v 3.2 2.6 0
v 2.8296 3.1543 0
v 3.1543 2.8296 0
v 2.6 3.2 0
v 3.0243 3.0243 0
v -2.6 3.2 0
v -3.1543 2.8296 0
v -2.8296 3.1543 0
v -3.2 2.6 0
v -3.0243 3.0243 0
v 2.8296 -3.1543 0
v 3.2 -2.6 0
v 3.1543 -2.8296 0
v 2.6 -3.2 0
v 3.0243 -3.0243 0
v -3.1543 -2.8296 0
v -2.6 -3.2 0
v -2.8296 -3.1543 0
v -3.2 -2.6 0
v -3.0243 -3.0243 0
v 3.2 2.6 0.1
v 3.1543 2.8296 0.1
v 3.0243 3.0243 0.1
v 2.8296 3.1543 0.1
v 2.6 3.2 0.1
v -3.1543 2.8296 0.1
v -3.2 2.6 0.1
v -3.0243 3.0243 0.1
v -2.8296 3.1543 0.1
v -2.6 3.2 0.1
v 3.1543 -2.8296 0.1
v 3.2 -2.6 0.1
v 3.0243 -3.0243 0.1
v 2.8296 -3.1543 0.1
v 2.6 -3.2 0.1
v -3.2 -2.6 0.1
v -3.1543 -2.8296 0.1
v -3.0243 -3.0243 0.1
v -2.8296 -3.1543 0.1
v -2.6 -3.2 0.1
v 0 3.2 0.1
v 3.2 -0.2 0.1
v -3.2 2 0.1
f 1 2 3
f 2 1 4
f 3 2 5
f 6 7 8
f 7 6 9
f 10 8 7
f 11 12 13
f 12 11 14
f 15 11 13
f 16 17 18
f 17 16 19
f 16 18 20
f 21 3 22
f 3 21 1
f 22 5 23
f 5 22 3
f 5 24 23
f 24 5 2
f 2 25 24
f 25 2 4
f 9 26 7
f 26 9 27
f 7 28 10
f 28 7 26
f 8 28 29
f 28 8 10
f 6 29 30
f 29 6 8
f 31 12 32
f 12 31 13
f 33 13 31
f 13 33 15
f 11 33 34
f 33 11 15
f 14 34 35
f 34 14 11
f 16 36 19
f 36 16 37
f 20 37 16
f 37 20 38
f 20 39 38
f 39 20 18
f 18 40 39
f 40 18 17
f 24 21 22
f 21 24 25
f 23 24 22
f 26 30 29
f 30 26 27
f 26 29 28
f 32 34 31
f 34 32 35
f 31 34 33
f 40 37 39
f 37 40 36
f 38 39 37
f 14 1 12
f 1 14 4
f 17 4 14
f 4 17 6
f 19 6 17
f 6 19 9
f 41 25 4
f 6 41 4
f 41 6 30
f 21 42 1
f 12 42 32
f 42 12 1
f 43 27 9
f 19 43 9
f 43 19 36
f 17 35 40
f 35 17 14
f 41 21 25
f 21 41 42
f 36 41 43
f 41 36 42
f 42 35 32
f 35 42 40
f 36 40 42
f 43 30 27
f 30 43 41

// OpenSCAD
// file: ../p/1-4cyli.scad
use <../lib.scad>
function ldraw_lib__1_4cyli() = [
// 0 Cylinder 0.25
// 0 Name: 1-4cyli.dat
// 0 Author: James Jessiman
// 0 !LDRAW_ORG Primitive UPDATE 2012-01
// 0 !LICENSE Licensed under CC BY 4.0 : see CAreadme.txt
// 
// 0 BFC CERTIFY CCW
  [0,"BFC","CERTIFY"],
  [0,"BFC","CCW"],
// 
// 0 !HISTORY 2002-03-23 [sbliss] Added BFC statement.
// 0 !HISTORY 2002-04-25 [PTadmin] Official Update 2002-02
// 0 !HISTORY 2007-06-22 [PTadmin] Header formatted for Contributor Agreement
// 0 !HISTORY 2008-07-01 [PTadmin] Official Update 2008-01
// 0 !HISTORY 2012-02-16 [Philo] Changed to CCW
// 0 !HISTORY 2012-03-30 [PTadmin] Official Update 2012-01
// 
// 
// 4 16 1 1 0 0.9239 1 0.3827 0.9239 0 0.3827 1 0 0
  [4,16,1,1,0,0.9239,1,0.3827,0.9239,0,0.3827,1,0,0],
// 5 24 1 0 0 1 1 0 0.9239 0 0.3827 1 0 -1
  [5,24,1,0,0,1,1,0,0.9239,0,0.3827,1,0,-1],
// 4 16 0.9239 1 0.3827 0.7071 1 0.7071 0.7071 0 0.7071 0.9239 0 0.3827
  [4,16,0.9239,1,0.3827,0.7071,1,0.7071,0.7071,0,0.7071,0.9239,0,0.3827],
// 5 24 0.9239 0 0.3827 0.9239 1 0.3827 0.7071 0 0.7071 1 0 0
  [5,24,0.9239,0,0.3827,0.9239,1,0.3827,0.7071,0,0.7071,1,0,0],
// 4 16 0.7071 1 0.7071 0.3827 1 0.9239 0.3827 0 0.9239 0.7071 0 0.7071
  [4,16,0.7071,1,0.7071,0.3827,1,0.9239,0.3827,0,0.9239,0.7071,0,0.7071],
// 5 24 0.7071 0 0.7071 0.7071 1 0.7071 0.3827 0 0.9239 0.9239 0 0.3827
  [5,24,0.7071,0,0.7071,0.7071,1,0.7071,0.3827,0,0.9239,0.9239,0,0.3827],
// 4 16 0.3827 1 0.9239 0 1 1 0 0 1 0.3827 0 0.9239
  [4,16,0.3827,1,0.9239,0,1,1,0,0,1,0.3827,0,0.9239],
// 5 24 0.3827 0 0.9239 0.3827 1 0.9239 0 0 1 0.7071 0 0.7071
  [5,24,0.3827,0,0.9239,0.3827,1,0.9239,0,0,1,0.7071,0,0.7071],
// 5 24 0 0 1 0 1 1 0.3827 0 0.9239 -1 0 1
  [5,24,0,0,1,0,1,1,0.3827,0,0.9239,-1,0,1],
];
module ldraw_lib__1_4cyli(step=0, col=false, unit=2/5, alt=false, line=0.2, solid=!$preview)
    makepoly(ldraw_lib__1_4cyli(), step=step, col=col, unit=unit, alt=alt, line=line, solid=solid);
ldraw_lib__1_4cyli(line=0.2);
// file: ../p/1-4chrd.scad
use <../lib.scad>
function ldraw_lib__1_4chrd() = [
// 0 Chord 0.25
// 0 Name: 1-4chrd.dat
// 0 Author: Max Martin Richter [MMR1988]
// 0 !LDRAW_ORG Primitive UPDATE 2023-05
// 0 !LICENSE Licensed under CC BY 4.0 : see CAreadme.txt
// 
// 0 BFC CERTIFY CCW
  [0,"BFC","CERTIFY"],
  [0,"BFC","CCW"],
// 
// 0 !HISTORY 2004-04-22 [PTadmin] Official Update 2004-02
// 0 !HISTORY 2007-10-09 [PTadmin] Header formatted for Contributor Agreement
// 0 !HISTORY 2008-07-01 [PTadmin] Official Update 2008-01
// 0 !HISTORY 2012-08-02 [MMR1988] Re-creation with PrimGen2 and Rectifier
// 0 !HISTORY 2012-08-09 [PTadmin] Official Update 2012-02
// 0 !HISTORY 2023-10-27 [OrionP] Change author to MMR1988 from hafhead
// 0 !HISTORY 2023-10-31 [OrionP] Official Update 2023-05
// 
// 4 16 0.9239 0 0.3827 0.3827 0 0.9239 0 0 1 1 0 0
  [4,16,0.9239,0,0.3827,0.3827,0,0.9239,0,0,1,1,0,0],
// 3 16 0.7071 0 0.7071 0.3827 0 0.9239 0.9239 0 0.3827
  [3,16,0.7071,0,0.7071,0.3827,0,0.9239,0.9239,0,0.3827],
];
module ldraw_lib__1_4chrd(step=0, col=false, unit=2/5, alt=false, line=0.2, solid=!$preview)
    makepoly(ldraw_lib__1_4chrd(), step=step, col=col, unit=unit, alt=alt, line=line, solid=solid);
ldraw_lib__1_4chrd(line=0.2);
// file: 6221655s.scad
use <../lib.scad>
use <../p/1-4chrd.scad>
use <../p/1-4cyli.scad>
function ldraw_lib__6221655s() = [
// 0 Sticker  0.8 x  0.8 with Grey and Red Stripes on White Background Right
// 0 Name: 6221655s.dat
// 0 Author: Massimo Maso [Sirio]
// 0 !LDRAW_ORG Part UPDATE 2024-09
// 0 !LICENSE Licensed under CC BY 4.0 : see CAreadme.txt
// 
// 0 BFC CERTIFY CCW
  [0,"BFC","CERTIFY"],
  [0,"BFC","CCW"],
// 
// 0 !KEYWORDS 3.0, 911 RSR, Porsche, Set 75888, Speed Champions
// 
// 0 !HISTORY 2024-10-27 [OrionP] Official Update 2024-09
// 
// 0 // Primitives
// 1 16 -6.5 0 6.5 -1.5 0 0 0 -1 0 0 0 1.5 1-4chrd.dat
  [1,16,-6.5,0,6.5,-1.5,0,0,0,-1,0,0,0,1.5, ldraw_lib__1_4chrd()],
// 1 16 6.5 0 6.5 1.5 0 0 0 -1 0 0 0 1.5 1-4chrd.dat
  [1,16,6.5,0,6.5,1.5,0,0,0,-1,0,0,0,1.5, ldraw_lib__1_4chrd()],
// 1 16 -6.5 0 -6.5 -1.5 0 0 0 -1 0 0 0 -1.5 1-4chrd.dat
  [1,16,-6.5,0,-6.5,-1.5,0,0,0,-1,0,0,0,-1.5, ldraw_lib__1_4chrd()],
// 1 16 6.5 0 -6.5 1.5 0 0 0 -1 0 0 0 -1.5 1-4chrd.dat
  [1,16,6.5,0,-6.5,1.5,0,0,0,-1,0,0,0,-1.5, ldraw_lib__1_4chrd()],
// 1 16 -6.5 -.25 6.5 -1.5 0 0 0 .25 0 0 0 1.5 1-4cyli.dat
  [1,16,-6.5,-.25,6.5,-1.5,0,0,0,.25,0,0,0,1.5, ldraw_lib__1_4cyli()],
// 1 16 6.5 -.25 6.5 1.5 0 0 0 .25 0 0 0 1.5 1-4cyli.dat
  [1,16,6.5,-.25,6.5,1.5,0,0,0,.25,0,0,0,1.5, ldraw_lib__1_4cyli()],
// 1 16 -6.5 -.25 -6.5 -1.5 0 0 0 .25 0 0 0 -1.5 1-4cyli.dat
  [1,16,-6.5,-.25,-6.5,-1.5,0,0,0,.25,0,0,0,-1.5, ldraw_lib__1_4cyli()],
// 1 16 6.5 -.25 -6.5 1.5 0 0 0 .25 0 0 0 -1.5 1-4cyli.dat
  [1,16,6.5,-.25,-6.5,1.5,0,0,0,.25,0,0,0,-1.5, ldraw_lib__1_4cyli()],
// 1 71 -6.5 -.25 6.5 -1.5 0 0 0 1 0 0 0 1.5 1-4chrd.dat
  [1,71,-6.5,-.25,6.5,-1.5,0,0,0,1,0,0,0,1.5, ldraw_lib__1_4chrd()],
// 1 15 6.5 -.25 6.5 1.5 0 0 0 1 0 0 0 1.5 1-4chrd.dat
  [1,15,6.5,-.25,6.5,1.5,0,0,0,1,0,0,0,1.5, ldraw_lib__1_4chrd()],
// 1 4 -6.5 -.25 -6.5 -1.5 0 0 0 1 0 0 0 -1.5 1-4chrd.dat
  [1,4,-6.5,-.25,-6.5,-1.5,0,0,0,1,0,0,0,-1.5, ldraw_lib__1_4chrd()],
// 1 4 6.5 -.25 -6.5 1.5 0 0 0 1 0 0 0 -1.5 1-4chrd.dat
  [1,4,6.5,-.25,-6.5,1.5,0,0,0,1,0,0,0,-1.5, ldraw_lib__1_4chrd()],
// 0 // Bottom face
// 4 16 -6.5 0 8 -6.5 0 -8 -8 0 -6.5 -8 0 6.5
  [4,16,-6.5,0,8,-6.5,0,-8,-8,0,-6.5,-8,0,6.5],
// 4 16 -6.5 0 8 6.5 0 8 6.5 0 -8 -6.5 0 -8
  [4,16,-6.5,0,8,6.5,0,8,6.5,0,-8,-6.5,0,-8],
// 4 16 6.5 0 8 8 0 6.5 8 0 -6.5 6.5 0 -8
  [4,16,6.5,0,8,8,0,6.5,8,0,-6.5,6.5,0,-8],
// 0 // Lateral face
// 3 16 -6.5 0 8 -6.5 -.25 8 0 -.25 8
  [3,16,-6.5,0,8,-6.5,-.25,8,0,-.25,8],
// 4 16 -6.5 0 8 0 -.25 8 6.5 -.25 8 6.5 0 8
  [4,16,-6.5,0,8,0,-.25,8,6.5,-.25,8,6.5,0,8],
// 3 16 -8 0 6.5 -8 -.25 -.5 -8 -.25 6.5
  [3,16,-8,0,6.5,-8,-.25,-.5,-8,-.25,6.5],
// 4 16 -8 0 6.5 -8 0 -6.5 -8 -.25 -6.5 -8 -.25 -.5
  [4,16,-8,0,6.5,-8,0,-6.5,-8,-.25,-6.5,-8,-.25,-.5],
// 3 16 8 0 6.5 8 -.25 6.5 8 -.25 5
  [3,16,8,0,6.5,8,-.25,6.5,8,-.25,5],
// 4 16 8 0 6.5 8 -.25 5 8 -.25 -6.5 8 0 -6.5
  [4,16,8,0,6.5,8,-.25,5,8,-.25,-6.5,8,0,-6.5],
// 4 16 -6.5 0 -8 6.5 0 -8 6.5 -.25 -8 -6.5 -.25 -8
  [4,16,-6.5,0,-8,6.5,0,-8,6.5,-.25,-8,-6.5,-.25,-8],
// 0 // Top face
// 0 // Grey faces
// 4 71 -8 -.25 -.5 0 -.25 8 -6.5 -.25 8 -8 -.25 6.5
  [4,71,-8,-.25,-.5,0,-.25,8,-6.5,-.25,8,-8,-.25,6.5],
// 4 71 -8 -.25 -.5 8 -.25 -6.5 8 -.25 5 0 -.25 8
  [4,71,-8,-.25,-.5,8,-.25,-6.5,8,-.25,5,0,-.25,8],
// 0 // Red faces
// 4 4 -8 -.25 -.5 -8 -.25 -6.5 -6.5 -.25 -8 6.5 -.25 -8
  [4,4,-8,-.25,-.5,-8,-.25,-6.5,-6.5,-.25,-8,6.5,-.25,-8],
// 3 4 -8 -.25 -.5 6.5 -.25 -8 8 -.25 -6.5
  [3,4,-8,-.25,-.5,6.5,-.25,-8,8,-.25,-6.5],
// 0 // White face
// 4 15 0 -.25 8 8 -.25 5 8 -.25 6.5 6.5 -.25 8
  [4,15,0,-.25,8,8,-.25,5,8,-.25,6.5,6.5,-.25,8],
];
module ldraw_lib__6221655s(step=0, col=false, unit=2/5, alt=false, line=0.2, solid=!$preview)
    makepoly(ldraw_lib__6221655s(), step=step, col=col, unit=unit, alt=alt, line=line, solid=solid);
ldraw_lib__6221655s(line=0.2);
// main file
use <../lib.scad>
use <6221655s.scad>
function ldraw_lib__6221655v() = [
// 0 Sticker  0.8 x  0.8 with Grey and Red Stripes on White Background Left
// 0 Name: 6221655v.dat
// 0 Author: Massimo Maso [Sirio]
// 0 !LDRAW_ORG Part UPDATE 2024-09
// 0 !LICENSE Licensed under CC BY 4.0 : see CAreadme.txt
// 
// 0 BFC CERTIFY CCW
  [0,"BFC","CERTIFY"],
  [0,"BFC","CCW"],
// 
// 0 !KEYWORDS 3.0, 911 RSR, Porsche, Set 75888, Speed Champions
// 
// 0 !HISTORY 2024-10-27 [OrionP] Official Update 2024-09
// 
// 1 16 0 0 0 -1 0 0 0 1 0 0 0 1 6221655s.dat
  [1,16,0,0,0,-1,0,0,0,1,0,0,0,1, ldraw_lib__6221655s()],
];
module ldraw_lib__6221655v(step=0, col=false, unit=2/5, alt=false, line=0.2, solid=!$preview)
    makepoly(ldraw_lib__6221655v(), step=step, col=col, unit=unit, alt=alt, line=line, solid=solid);
ldraw_lib__6221655v(line=0.2);
